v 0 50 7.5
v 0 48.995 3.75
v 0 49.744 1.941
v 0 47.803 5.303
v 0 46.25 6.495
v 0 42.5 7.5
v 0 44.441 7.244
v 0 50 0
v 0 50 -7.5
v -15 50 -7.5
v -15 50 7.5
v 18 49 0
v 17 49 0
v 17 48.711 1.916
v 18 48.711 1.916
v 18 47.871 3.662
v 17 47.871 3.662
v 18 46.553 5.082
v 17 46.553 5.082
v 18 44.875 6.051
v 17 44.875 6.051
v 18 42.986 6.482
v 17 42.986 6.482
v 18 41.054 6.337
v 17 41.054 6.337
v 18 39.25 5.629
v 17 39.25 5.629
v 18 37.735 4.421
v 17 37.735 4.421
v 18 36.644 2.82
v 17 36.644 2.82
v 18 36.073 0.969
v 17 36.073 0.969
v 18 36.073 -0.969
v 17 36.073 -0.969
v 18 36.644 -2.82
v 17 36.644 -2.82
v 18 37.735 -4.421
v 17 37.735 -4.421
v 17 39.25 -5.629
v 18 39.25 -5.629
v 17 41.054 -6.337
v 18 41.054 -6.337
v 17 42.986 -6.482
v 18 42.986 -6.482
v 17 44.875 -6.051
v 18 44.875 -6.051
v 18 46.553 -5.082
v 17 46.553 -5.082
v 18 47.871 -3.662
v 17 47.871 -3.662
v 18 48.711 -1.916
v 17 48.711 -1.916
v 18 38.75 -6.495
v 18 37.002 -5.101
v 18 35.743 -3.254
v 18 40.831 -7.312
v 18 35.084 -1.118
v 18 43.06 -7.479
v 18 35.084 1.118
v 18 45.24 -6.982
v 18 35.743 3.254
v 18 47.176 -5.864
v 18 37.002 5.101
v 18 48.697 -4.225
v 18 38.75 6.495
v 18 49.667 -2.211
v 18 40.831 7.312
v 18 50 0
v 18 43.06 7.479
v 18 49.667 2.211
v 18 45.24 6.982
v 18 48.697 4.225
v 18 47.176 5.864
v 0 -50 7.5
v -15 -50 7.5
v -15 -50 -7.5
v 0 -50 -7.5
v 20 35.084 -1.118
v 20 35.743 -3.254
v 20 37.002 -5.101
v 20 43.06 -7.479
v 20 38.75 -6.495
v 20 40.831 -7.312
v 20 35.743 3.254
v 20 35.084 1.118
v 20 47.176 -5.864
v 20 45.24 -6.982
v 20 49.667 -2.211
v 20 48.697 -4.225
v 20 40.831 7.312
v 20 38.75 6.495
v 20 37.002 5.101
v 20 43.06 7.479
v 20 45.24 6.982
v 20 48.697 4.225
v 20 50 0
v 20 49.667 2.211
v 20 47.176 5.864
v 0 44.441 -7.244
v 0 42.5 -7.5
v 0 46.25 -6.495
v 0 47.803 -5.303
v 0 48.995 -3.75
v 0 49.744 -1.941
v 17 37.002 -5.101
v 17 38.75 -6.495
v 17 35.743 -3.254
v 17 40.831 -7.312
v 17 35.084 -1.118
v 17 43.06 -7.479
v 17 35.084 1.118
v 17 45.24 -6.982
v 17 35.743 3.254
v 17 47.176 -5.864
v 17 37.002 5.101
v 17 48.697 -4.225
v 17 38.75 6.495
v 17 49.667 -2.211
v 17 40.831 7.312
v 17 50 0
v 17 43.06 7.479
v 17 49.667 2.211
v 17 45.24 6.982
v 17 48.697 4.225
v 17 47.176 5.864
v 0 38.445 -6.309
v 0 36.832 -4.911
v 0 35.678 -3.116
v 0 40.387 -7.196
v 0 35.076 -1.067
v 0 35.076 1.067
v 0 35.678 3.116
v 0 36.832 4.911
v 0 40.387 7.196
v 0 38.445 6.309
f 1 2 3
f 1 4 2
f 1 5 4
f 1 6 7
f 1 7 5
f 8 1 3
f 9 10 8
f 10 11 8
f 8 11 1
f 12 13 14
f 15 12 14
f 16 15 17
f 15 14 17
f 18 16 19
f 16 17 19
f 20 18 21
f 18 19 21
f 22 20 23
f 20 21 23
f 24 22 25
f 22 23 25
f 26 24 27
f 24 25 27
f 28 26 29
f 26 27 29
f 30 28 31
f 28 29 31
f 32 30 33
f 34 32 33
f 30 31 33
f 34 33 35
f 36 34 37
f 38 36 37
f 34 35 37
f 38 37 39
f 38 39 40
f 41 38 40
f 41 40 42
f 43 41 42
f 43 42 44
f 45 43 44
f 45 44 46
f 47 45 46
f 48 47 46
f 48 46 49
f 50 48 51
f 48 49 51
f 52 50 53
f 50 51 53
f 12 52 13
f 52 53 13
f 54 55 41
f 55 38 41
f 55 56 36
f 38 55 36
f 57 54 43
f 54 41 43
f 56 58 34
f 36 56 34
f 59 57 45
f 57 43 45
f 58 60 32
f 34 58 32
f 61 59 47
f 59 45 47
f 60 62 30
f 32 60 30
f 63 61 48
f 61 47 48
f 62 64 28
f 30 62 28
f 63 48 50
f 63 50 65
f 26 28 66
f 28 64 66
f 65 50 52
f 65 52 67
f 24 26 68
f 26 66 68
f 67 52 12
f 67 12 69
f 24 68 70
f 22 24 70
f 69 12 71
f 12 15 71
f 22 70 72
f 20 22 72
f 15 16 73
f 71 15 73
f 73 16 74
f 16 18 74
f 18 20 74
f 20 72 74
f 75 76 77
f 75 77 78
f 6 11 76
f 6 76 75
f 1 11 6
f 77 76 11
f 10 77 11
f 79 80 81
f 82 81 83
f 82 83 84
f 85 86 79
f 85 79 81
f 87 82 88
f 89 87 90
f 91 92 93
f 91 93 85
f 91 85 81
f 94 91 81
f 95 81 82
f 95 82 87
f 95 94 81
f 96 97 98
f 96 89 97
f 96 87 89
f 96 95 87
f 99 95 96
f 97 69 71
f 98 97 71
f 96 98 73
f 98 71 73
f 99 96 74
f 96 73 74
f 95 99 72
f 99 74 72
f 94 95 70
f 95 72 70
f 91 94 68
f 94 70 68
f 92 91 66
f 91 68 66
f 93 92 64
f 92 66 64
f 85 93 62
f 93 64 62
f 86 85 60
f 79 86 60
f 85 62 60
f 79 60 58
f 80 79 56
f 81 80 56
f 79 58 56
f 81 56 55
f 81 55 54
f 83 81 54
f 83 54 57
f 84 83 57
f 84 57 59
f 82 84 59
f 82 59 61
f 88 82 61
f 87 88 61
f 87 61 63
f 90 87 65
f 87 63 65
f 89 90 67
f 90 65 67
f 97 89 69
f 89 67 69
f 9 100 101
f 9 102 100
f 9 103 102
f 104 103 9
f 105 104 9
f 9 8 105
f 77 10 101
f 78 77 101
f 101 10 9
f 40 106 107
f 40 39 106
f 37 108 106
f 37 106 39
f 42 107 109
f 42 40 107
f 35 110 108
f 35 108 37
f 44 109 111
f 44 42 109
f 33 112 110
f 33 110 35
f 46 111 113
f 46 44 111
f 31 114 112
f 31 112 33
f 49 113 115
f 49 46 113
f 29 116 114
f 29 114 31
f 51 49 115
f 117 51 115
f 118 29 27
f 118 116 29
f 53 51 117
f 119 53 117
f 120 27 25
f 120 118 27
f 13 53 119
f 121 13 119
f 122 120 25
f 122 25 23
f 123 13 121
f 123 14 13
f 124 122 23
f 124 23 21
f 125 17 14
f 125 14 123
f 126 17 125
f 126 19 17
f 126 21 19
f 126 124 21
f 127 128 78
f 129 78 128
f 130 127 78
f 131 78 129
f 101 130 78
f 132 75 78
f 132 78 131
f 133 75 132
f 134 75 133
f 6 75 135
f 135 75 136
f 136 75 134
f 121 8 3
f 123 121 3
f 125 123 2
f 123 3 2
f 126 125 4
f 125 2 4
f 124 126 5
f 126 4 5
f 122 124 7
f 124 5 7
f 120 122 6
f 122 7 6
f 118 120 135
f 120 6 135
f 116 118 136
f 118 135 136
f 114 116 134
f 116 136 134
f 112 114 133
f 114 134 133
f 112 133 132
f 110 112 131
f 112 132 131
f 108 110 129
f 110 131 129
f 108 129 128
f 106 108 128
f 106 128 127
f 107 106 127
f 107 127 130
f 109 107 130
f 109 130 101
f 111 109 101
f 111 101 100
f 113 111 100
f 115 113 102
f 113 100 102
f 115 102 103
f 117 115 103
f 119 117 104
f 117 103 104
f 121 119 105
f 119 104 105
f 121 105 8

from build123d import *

# Parameters (mm, degrees)
F0_W     = 15
F0_H     = 100
F1_DEPTH = 7.5
F2_R     = 7.5
F3_DEPTH = 17
F4_R     = 6.5
F5_DEPTH = 1
F6_R     = 7.5
F7_DEPTH = 2


with BuildPart() as f1:
    # F0 (on Top) → F1 (new body, symmetric)
    with BuildSketch(Plane.XY):
        with Locations((-7.5, 0)):
            Rectangle(F0_W, F0_H)
    extrude(amount=F1_DEPTH, both=True)

    # F2 (on face) → F3 (join)
    with BuildSketch(Plane.YZ):
        with Locations((42.5, 0)):
            Circle(F2_R)
    extrude(amount=F3_DEPTH)

    # F4 (on face) → F5 (join)
    with BuildSketch(Plane.YZ.offset(17)):
        with Locations((42.5, 0)):
            Circle(F4_R)
    extrude(amount=F5_DEPTH)

    # F6 (on face) → F7 (join)
    with BuildSketch(Plane.YZ.offset(18)):
        with Locations((42.5, 0)):
            Circle(F6_R)
    extrude(amount=F7_DEPTH)


solid = f1.part
